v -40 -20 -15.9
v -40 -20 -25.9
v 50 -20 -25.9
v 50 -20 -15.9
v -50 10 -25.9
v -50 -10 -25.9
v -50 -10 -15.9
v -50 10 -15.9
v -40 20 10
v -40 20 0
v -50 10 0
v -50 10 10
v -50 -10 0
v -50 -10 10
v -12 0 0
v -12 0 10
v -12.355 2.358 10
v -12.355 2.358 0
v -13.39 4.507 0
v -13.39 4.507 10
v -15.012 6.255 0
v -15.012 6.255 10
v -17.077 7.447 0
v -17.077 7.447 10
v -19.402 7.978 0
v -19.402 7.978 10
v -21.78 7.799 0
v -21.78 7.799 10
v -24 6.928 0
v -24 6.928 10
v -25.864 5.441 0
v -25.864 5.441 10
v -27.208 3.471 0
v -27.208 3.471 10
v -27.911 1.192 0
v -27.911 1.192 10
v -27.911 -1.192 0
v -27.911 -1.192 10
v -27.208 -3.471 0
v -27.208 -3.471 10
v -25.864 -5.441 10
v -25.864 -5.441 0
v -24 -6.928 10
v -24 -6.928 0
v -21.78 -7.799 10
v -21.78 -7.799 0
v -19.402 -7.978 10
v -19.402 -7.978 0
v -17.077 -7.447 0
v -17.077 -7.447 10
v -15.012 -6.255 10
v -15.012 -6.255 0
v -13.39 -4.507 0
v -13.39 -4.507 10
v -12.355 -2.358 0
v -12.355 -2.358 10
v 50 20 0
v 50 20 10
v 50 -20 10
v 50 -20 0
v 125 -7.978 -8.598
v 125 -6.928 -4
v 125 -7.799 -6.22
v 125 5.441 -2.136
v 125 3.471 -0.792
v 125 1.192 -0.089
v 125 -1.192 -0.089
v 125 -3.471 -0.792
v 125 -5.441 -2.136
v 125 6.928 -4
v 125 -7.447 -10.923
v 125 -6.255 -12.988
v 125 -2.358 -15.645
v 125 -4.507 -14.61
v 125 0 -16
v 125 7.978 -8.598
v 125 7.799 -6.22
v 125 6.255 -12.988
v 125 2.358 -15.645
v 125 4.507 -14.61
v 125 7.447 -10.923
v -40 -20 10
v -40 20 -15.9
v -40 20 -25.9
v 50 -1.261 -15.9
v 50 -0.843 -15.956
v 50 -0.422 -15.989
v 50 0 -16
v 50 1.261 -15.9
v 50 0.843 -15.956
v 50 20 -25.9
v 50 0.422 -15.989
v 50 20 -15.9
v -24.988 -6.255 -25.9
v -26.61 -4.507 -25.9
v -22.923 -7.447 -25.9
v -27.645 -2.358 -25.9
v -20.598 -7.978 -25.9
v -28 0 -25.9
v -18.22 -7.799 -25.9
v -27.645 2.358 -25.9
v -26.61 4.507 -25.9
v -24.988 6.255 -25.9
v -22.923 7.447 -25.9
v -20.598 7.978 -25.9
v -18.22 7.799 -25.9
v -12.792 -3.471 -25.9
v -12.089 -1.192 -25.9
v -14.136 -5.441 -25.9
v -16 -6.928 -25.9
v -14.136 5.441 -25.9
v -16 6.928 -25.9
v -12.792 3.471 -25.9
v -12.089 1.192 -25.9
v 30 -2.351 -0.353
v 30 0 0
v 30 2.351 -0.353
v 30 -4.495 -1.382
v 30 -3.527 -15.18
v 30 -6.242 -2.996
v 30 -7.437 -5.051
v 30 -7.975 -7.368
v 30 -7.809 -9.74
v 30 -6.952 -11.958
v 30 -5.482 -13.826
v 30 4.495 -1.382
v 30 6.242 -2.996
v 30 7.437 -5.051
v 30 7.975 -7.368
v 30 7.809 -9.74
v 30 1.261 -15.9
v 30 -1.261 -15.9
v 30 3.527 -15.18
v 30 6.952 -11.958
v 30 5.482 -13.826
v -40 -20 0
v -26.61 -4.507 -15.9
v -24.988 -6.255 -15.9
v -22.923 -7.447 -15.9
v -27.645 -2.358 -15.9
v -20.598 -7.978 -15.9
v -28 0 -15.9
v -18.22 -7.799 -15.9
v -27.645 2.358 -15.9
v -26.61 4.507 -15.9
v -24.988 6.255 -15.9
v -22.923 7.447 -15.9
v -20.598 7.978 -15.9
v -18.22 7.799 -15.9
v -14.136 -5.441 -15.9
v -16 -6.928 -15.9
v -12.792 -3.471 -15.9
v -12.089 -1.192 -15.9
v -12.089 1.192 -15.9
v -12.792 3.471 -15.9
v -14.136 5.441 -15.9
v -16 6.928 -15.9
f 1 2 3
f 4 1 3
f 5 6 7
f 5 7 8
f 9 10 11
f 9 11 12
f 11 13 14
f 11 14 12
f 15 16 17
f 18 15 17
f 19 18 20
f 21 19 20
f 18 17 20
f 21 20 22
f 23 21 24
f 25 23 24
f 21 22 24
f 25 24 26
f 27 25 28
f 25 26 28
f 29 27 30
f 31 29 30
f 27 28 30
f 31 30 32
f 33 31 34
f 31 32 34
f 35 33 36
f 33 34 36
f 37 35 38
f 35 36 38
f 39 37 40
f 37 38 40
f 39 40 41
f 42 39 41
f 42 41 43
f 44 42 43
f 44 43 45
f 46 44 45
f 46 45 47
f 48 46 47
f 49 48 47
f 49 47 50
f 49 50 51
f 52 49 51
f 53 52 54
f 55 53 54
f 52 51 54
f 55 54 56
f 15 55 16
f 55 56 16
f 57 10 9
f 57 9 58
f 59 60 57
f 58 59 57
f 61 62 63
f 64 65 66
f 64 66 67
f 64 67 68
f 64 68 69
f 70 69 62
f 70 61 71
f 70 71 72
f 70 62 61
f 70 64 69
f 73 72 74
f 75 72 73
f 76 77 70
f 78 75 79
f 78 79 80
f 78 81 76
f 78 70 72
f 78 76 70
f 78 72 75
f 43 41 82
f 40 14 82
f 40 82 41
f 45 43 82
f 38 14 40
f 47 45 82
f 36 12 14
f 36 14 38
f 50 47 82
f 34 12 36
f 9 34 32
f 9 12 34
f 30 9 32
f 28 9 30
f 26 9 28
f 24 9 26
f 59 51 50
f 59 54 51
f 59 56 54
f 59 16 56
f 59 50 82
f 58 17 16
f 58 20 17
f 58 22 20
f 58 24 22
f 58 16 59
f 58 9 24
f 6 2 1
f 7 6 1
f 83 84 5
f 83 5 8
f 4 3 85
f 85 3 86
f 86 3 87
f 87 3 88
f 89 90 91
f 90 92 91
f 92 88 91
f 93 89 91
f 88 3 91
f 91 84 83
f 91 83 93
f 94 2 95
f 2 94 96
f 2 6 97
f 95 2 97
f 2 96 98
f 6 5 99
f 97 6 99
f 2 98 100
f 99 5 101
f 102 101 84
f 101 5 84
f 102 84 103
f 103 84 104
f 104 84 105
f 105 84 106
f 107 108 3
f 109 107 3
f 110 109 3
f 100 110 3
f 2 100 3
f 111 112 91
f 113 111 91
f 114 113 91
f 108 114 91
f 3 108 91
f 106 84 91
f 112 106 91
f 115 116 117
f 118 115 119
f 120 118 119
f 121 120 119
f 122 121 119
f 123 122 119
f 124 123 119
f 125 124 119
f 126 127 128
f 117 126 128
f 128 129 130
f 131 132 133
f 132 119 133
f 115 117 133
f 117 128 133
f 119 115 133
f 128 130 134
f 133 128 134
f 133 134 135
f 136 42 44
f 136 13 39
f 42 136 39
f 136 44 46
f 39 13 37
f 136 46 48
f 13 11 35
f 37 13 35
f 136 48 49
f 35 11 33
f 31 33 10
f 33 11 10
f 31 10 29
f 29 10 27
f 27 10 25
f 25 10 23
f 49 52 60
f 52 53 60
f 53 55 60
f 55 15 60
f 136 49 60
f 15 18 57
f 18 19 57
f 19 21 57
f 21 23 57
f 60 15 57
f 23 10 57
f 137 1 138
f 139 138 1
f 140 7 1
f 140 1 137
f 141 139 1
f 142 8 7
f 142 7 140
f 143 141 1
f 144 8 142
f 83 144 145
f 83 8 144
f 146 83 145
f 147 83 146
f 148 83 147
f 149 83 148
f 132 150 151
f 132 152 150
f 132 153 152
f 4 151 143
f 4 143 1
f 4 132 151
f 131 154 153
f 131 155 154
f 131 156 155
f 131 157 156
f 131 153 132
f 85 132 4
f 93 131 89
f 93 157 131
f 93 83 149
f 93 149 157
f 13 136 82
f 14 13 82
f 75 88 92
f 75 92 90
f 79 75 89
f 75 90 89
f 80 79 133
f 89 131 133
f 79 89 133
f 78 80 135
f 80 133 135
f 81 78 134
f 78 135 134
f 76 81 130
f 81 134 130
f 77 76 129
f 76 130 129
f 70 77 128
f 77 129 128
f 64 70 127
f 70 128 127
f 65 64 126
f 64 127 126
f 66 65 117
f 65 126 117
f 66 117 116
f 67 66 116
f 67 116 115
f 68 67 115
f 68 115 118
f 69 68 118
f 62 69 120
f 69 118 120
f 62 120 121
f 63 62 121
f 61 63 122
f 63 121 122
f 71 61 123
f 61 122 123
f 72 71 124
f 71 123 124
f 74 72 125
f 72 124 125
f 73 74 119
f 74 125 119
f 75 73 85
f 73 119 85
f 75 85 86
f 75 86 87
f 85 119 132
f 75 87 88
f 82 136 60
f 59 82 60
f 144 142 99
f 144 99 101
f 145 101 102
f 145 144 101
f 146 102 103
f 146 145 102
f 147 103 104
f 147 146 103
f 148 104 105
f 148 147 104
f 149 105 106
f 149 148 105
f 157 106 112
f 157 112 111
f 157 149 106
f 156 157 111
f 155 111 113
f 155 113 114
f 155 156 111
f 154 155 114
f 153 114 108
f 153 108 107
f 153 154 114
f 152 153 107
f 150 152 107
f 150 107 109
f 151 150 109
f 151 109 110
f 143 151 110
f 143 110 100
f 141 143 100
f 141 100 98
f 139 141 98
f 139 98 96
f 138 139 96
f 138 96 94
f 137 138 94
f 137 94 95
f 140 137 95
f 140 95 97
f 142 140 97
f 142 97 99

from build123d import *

# Parameters (mm, degrees)
SKETCH1_W                = 100
SKETCH1_H                = 40
BOSS_EXTRUDE1_DEPTH      = 10
SKETCH4_R                = 8
CUT_EXTRUDE1_DEPTH       = 10
CHAMFER2_SIZE            = 10
CHAMFER3_SIZE            = 10
BOSS_EXTRUDE2_DEPTH      = 75
BOSS_EXTRUDE2_DEPTH_BACK = 20
SKETCH5_R                = 8
LPATTERN1_COUNT          = 2
LPATTERN1_PITCH          = 25.9
CHAMFER4_SIZE            = 10
CHAMFER5_SIZE            = 10
CUT_EXTRUDE2_START       = -100
SKETCH6_R                = 8
CUT_EXTRUDE2_DEPTH       = 100


with BuildPart() as part:
    # Sketch1 → Boss-Extrude1 (new body)
    with BuildSketch(Plane.XY):
        Rectangle(SKETCH1_W, SKETCH1_H)
    boss_extrude1 = extrude(amount=BOSS_EXTRUDE1_DEPTH)

    # Sketch4 → Cut-Extrude1 (cut)
    with BuildSketch(Plane.XY.offset(10)):
        with Locations((-20, 0)):
            Circle(SKETCH4_R)
    extrude(amount=-CUT_EXTRUDE1_DEPTH, mode=Mode.SUBTRACT)

    # Chamfer2
    chamfer2_edges = [part.edges().sort_by_distance(p)[0] for p in [
        (-50, 20, 5),
    ]]
    chamfer(chamfer2_edges, length=CHAMFER2_SIZE)

    # Chamfer3
    chamfer3_edges = [part.edges().sort_by_distance(p)[0] for p in [
        (-50, -20, 5),
    ]]
    chamfer(chamfer3_edges, length=CHAMFER3_SIZE)


with BuildPart() as body_2:
    # Sketch5 → Boss-Extrude2 (new, two sides: drawn at the far end of the back side and taken through both)
    with BuildSketch(Plane(origin=(50, 0, 0), x_dir=(0, 0, -1), z_dir=(1, 0, 0)).offset(-BOSS_EXTRUDE2_DEPTH_BACK)):
        with Locations((8, 0)):
            Circle(SKETCH5_R)
    extrude(amount=BOSS_EXTRUDE2_DEPTH + BOSS_EXTRUDE2_DEPTH_BACK)

    # LPattern1: Boss-Extrude1 ×2
    with Locations(*[(0, 0, -i * LPATTERN1_PITCH) for i in range(1, LPATTERN1_COUNT)]):
        add(boss_extrude1)

    # Chamfer4
    chamfer4_edges = [body_2.edges().sort_by_distance(p)[0] for p in [
        (-50, 20, -20.9),
    ]]
    chamfer(chamfer4_edges, length=CHAMFER4_SIZE)

    # Chamfer5
    chamfer5_edges = [body_2.edges().sort_by_distance(p)[0] for p in [
        (-50, -20, -20.9),
    ]]
    chamfer(chamfer5_edges, length=CHAMFER5_SIZE)

    # Sketch6 → Cut-Extrude2 (cut)
    with BuildSketch(Plane(origin=(0, 0, -25.9), x_dir=(-1, 0, 0), z_dir=(0, 0, -1)).offset(CUT_EXTRUDE2_START)):
        with Locations((20, 0)):
            Circle(SKETCH6_R)
    extrude(amount=CUT_EXTRUDE2_DEPTH, mode=Mode.SUBTRACT)


solid = Compound([part.part, body_2.part])
